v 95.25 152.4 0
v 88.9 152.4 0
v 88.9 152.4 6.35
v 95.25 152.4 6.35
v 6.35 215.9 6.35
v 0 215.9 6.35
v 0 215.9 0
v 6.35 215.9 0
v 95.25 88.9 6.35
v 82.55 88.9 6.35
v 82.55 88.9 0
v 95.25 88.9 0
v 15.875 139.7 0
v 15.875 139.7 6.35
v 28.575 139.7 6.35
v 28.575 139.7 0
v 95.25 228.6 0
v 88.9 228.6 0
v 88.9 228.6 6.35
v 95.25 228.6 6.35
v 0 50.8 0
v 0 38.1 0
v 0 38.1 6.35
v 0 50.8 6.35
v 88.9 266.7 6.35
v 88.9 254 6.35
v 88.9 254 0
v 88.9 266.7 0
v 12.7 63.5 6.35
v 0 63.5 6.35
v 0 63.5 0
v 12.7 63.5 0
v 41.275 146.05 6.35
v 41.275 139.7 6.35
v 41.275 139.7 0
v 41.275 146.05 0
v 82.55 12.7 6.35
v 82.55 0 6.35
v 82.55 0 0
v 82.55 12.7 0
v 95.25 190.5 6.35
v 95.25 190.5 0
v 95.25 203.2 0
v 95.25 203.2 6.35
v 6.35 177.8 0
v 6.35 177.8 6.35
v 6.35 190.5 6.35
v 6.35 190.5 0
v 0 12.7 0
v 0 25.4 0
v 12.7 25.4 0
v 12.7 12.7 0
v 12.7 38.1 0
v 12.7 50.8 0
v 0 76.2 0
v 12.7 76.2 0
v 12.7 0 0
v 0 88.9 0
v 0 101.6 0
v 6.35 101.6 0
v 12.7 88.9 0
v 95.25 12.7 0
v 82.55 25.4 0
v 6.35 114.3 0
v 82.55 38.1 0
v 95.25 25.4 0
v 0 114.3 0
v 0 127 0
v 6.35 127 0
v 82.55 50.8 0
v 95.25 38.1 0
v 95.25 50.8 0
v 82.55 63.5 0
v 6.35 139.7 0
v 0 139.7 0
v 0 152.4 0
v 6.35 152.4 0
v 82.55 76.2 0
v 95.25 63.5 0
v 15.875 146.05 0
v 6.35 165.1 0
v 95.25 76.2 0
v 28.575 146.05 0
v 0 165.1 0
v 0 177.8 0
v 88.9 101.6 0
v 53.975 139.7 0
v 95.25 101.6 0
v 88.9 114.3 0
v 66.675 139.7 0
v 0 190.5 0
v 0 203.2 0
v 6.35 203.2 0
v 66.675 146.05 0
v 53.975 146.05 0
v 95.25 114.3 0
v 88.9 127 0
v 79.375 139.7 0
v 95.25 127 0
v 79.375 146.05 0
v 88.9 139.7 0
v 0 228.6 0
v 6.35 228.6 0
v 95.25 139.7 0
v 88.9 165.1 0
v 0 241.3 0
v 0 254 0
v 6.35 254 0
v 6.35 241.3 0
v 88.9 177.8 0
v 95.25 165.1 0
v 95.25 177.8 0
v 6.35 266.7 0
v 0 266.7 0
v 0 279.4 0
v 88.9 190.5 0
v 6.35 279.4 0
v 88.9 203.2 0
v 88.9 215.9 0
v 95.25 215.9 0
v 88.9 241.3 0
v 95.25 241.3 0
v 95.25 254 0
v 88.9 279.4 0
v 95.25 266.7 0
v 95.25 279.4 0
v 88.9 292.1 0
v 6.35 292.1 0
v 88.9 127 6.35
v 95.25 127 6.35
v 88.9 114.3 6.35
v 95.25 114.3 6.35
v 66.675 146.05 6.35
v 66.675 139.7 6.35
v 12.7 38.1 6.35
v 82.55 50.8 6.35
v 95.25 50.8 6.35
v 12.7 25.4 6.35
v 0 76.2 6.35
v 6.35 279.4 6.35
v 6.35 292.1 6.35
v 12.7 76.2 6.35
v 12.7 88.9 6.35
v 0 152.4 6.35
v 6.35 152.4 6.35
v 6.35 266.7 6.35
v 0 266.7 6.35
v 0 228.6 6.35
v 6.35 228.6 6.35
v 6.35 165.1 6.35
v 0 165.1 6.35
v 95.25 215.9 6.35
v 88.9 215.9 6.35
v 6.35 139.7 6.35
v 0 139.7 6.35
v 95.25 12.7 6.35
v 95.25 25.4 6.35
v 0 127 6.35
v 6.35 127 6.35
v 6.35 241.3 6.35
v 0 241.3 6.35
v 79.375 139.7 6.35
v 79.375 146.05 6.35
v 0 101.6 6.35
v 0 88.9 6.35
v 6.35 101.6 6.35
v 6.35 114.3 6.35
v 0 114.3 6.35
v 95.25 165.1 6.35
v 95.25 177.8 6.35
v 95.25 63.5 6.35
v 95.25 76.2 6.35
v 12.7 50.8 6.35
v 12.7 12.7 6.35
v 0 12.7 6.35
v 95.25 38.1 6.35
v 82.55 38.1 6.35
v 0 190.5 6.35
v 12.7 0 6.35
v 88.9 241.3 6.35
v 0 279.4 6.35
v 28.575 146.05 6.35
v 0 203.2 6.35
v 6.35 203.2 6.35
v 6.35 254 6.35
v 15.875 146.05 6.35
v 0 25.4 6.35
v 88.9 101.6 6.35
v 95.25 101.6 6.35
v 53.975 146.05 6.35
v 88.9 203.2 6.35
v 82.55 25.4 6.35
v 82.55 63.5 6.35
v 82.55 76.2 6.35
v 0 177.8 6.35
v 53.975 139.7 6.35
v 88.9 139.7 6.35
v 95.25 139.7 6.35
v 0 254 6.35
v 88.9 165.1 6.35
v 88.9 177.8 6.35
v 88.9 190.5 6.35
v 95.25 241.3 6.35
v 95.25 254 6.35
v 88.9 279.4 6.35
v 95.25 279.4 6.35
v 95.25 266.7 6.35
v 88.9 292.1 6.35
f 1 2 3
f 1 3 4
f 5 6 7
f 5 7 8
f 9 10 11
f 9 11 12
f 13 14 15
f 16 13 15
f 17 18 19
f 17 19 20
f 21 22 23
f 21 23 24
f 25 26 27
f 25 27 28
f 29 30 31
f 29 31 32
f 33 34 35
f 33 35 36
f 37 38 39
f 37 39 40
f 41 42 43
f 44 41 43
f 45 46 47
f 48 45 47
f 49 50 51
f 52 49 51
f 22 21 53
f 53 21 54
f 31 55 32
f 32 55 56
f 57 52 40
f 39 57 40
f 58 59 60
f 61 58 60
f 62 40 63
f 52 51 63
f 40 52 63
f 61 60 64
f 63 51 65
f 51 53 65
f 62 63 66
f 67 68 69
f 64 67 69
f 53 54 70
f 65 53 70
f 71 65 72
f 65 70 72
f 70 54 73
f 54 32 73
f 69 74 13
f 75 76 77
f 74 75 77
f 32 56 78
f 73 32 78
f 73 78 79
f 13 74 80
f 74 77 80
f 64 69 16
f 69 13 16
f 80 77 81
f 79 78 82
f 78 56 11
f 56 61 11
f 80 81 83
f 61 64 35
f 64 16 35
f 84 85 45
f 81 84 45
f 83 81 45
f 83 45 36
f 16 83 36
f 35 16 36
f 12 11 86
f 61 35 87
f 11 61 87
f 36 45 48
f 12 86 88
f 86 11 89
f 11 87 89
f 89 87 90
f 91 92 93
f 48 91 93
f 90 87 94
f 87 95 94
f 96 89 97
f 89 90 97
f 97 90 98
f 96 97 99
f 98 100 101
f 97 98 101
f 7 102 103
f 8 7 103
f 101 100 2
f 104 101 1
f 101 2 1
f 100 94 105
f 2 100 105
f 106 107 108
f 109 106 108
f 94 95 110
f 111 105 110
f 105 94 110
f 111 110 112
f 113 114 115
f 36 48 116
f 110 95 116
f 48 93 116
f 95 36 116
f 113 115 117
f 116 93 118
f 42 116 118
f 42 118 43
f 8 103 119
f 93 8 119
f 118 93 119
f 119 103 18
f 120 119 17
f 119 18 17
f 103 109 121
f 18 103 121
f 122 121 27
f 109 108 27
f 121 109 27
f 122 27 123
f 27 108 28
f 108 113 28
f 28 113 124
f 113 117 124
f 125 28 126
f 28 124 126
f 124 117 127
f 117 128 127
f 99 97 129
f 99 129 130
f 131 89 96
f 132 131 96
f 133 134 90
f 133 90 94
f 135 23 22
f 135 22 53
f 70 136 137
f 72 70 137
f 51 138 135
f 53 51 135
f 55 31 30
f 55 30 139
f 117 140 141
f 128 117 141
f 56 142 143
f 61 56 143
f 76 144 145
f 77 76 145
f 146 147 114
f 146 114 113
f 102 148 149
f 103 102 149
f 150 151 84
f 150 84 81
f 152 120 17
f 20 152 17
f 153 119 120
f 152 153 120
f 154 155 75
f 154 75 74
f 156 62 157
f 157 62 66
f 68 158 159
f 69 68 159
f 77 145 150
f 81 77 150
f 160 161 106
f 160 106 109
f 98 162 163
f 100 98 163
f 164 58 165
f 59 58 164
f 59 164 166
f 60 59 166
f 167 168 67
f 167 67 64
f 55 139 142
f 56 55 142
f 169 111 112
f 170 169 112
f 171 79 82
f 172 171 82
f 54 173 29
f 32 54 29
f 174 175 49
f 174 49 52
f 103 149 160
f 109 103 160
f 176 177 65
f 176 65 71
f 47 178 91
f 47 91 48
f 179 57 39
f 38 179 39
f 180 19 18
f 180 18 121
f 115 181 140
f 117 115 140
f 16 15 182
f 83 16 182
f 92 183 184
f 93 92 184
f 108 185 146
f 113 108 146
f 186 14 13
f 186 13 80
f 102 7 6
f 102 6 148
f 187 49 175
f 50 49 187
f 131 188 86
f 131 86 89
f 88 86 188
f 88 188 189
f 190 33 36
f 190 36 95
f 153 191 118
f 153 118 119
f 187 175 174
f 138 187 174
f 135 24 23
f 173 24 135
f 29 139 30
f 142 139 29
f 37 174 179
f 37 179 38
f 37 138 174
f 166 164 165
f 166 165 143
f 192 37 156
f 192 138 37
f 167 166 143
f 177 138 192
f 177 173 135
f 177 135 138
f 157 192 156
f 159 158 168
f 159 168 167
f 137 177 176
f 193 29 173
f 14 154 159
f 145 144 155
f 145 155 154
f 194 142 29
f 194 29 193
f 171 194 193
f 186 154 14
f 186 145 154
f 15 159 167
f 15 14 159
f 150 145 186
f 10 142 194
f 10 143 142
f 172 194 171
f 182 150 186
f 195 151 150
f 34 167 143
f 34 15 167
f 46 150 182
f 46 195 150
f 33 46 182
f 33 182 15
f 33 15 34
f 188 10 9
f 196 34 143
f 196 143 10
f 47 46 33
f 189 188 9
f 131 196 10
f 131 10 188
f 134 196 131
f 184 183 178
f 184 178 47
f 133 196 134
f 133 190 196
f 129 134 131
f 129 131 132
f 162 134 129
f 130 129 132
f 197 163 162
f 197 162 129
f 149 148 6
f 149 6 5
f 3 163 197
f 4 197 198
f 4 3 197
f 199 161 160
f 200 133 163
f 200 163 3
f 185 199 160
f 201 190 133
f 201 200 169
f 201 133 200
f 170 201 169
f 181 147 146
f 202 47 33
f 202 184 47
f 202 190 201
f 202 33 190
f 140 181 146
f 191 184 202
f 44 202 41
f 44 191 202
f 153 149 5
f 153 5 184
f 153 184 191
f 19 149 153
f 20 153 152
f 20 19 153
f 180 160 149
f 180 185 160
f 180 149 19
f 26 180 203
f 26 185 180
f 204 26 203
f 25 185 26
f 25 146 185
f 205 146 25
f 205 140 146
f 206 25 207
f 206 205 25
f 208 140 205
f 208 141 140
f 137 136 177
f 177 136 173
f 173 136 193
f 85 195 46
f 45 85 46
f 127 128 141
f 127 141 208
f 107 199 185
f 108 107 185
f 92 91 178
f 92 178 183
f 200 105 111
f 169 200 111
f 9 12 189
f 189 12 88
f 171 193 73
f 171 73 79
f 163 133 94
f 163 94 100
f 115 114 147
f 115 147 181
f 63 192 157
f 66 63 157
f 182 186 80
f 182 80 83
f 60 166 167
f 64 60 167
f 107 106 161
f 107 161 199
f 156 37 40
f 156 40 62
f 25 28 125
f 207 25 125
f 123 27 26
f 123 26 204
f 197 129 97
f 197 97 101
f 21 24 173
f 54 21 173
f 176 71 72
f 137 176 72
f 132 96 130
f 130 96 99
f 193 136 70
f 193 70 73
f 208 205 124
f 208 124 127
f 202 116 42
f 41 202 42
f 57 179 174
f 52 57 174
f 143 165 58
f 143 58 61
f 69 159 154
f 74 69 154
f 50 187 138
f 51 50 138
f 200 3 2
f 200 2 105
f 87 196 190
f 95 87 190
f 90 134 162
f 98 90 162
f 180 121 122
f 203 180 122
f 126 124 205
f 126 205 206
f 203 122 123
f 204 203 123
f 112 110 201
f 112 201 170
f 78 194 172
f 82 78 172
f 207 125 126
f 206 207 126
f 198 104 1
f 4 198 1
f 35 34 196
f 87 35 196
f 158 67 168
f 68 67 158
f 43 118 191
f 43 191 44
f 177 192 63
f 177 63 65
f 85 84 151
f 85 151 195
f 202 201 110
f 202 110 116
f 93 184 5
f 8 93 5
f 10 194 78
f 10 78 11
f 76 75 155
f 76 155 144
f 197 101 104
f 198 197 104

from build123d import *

# Parameters (mm, degrees)
SKETCH1_W           = 95.25
SKETCH1_H           = 292.1
BOSS_EXTRUDE1_DEPTH = 6.35
SKETCH2_W           = 6.35
SKETCH2_H           = 12.7
CUT_EXTRUDE1_DEPTH  = 7.35
LPATTERN1_COUNT     = 12
LPATTERN1_PITCH     = 25.4
SKETCH3_W           = 6.35
SKETCH3_H           = 12.7
CUT_EXTRUDE2_DEPTH  = 7.35
LPATTERN2_COUNT     = 4
LPATTERN2_PITCH     = 25.4
SKETCH4_W           = 12.7
SKETCH4_H           = 6.35
CUT_EXTRUDE3_DEPTH  = 7.35
LPATTERN3_COUNT     = 2
LPATTERN3_PITCH     = 25.4
LPATTERN3_COL_COUNT = 2
LPATTERN3_COL_PITCH = 25.4


with BuildPart() as part:
    # Sketch1 → Boss-Extrude1 (new body)
    with BuildSketch(Plane.XY):
        with Locations((47.625, 146.05)):
            Rectangle(SKETCH1_W, SKETCH1_H)
    extrude(amount=BOSS_EXTRUDE1_DEPTH)

    # Sketch2 → Cut-Extrude1 (cut, through all)
    with BuildSketch(Plane.XY.offset(6.35)):
        with Locations((3.175, 6.35)):
            Rectangle(SKETCH2_W, SKETCH2_H)
        with Locations((92.075, 6.35)):
            Rectangle(SKETCH2_W, SKETCH2_H)
    cut_extrude1 = extrude(amount=-CUT_EXTRUDE1_DEPTH, mode=Mode.SUBTRACT)

    # LPattern1: Cut-Extrude1 ×12
    with Locations(*[(0, i * LPATTERN1_PITCH, 0) for i in range(1, LPATTERN1_COUNT)]):
        add(cut_extrude1, mode=Mode.SUBTRACT)

    # Sketch3 → Cut-Extrude2 (cut, through all)
    with BuildSketch(Plane.XY.offset(6.35)):
        with Locations((85.725, 6.35)):
            Rectangle(SKETCH3_W, SKETCH3_H)
        with Locations((9.525, 6.35)):
            Rectangle(SKETCH3_W, SKETCH3_H)
    cut_extrude2 = extrude(amount=-CUT_EXTRUDE2_DEPTH, mode=Mode.SUBTRACT)

    # LPattern2: Cut-Extrude2 ×4
    with Locations(*[(0, i * LPATTERN2_PITCH, 0) for i in range(1, LPATTERN2_COUNT)]):
        add(cut_extrude2, mode=Mode.SUBTRACT)

    # Sketch4 → Cut-Extrude3 (cut, through all)
    with BuildSketch(Plane.XY.offset(6.35)):
        with Locations((47.625, 142.875)):
            Rectangle(SKETCH4_W, SKETCH4_H)
    cut_extrude3 = extrude(amount=-CUT_EXTRUDE3_DEPTH, mode=Mode.SUBTRACT)

    # LPattern3: Cut-Extrude3 ×2
    with Locations(*[(-i * LPATTERN3_PITCH, 0, 0) for i in range(1, LPATTERN3_COUNT)]):
        add(cut_extrude3, mode=Mode.SUBTRACT)

    # LPattern3 col: Cut-Extrude3 ×2
    with Locations(*[(i * LPATTERN3_COL_PITCH, 0, 0) for i in range(1, LPATTERN3_COL_COUNT)]):
        add(cut_extrude3, mode=Mode.SUBTRACT)


solid = part.part
